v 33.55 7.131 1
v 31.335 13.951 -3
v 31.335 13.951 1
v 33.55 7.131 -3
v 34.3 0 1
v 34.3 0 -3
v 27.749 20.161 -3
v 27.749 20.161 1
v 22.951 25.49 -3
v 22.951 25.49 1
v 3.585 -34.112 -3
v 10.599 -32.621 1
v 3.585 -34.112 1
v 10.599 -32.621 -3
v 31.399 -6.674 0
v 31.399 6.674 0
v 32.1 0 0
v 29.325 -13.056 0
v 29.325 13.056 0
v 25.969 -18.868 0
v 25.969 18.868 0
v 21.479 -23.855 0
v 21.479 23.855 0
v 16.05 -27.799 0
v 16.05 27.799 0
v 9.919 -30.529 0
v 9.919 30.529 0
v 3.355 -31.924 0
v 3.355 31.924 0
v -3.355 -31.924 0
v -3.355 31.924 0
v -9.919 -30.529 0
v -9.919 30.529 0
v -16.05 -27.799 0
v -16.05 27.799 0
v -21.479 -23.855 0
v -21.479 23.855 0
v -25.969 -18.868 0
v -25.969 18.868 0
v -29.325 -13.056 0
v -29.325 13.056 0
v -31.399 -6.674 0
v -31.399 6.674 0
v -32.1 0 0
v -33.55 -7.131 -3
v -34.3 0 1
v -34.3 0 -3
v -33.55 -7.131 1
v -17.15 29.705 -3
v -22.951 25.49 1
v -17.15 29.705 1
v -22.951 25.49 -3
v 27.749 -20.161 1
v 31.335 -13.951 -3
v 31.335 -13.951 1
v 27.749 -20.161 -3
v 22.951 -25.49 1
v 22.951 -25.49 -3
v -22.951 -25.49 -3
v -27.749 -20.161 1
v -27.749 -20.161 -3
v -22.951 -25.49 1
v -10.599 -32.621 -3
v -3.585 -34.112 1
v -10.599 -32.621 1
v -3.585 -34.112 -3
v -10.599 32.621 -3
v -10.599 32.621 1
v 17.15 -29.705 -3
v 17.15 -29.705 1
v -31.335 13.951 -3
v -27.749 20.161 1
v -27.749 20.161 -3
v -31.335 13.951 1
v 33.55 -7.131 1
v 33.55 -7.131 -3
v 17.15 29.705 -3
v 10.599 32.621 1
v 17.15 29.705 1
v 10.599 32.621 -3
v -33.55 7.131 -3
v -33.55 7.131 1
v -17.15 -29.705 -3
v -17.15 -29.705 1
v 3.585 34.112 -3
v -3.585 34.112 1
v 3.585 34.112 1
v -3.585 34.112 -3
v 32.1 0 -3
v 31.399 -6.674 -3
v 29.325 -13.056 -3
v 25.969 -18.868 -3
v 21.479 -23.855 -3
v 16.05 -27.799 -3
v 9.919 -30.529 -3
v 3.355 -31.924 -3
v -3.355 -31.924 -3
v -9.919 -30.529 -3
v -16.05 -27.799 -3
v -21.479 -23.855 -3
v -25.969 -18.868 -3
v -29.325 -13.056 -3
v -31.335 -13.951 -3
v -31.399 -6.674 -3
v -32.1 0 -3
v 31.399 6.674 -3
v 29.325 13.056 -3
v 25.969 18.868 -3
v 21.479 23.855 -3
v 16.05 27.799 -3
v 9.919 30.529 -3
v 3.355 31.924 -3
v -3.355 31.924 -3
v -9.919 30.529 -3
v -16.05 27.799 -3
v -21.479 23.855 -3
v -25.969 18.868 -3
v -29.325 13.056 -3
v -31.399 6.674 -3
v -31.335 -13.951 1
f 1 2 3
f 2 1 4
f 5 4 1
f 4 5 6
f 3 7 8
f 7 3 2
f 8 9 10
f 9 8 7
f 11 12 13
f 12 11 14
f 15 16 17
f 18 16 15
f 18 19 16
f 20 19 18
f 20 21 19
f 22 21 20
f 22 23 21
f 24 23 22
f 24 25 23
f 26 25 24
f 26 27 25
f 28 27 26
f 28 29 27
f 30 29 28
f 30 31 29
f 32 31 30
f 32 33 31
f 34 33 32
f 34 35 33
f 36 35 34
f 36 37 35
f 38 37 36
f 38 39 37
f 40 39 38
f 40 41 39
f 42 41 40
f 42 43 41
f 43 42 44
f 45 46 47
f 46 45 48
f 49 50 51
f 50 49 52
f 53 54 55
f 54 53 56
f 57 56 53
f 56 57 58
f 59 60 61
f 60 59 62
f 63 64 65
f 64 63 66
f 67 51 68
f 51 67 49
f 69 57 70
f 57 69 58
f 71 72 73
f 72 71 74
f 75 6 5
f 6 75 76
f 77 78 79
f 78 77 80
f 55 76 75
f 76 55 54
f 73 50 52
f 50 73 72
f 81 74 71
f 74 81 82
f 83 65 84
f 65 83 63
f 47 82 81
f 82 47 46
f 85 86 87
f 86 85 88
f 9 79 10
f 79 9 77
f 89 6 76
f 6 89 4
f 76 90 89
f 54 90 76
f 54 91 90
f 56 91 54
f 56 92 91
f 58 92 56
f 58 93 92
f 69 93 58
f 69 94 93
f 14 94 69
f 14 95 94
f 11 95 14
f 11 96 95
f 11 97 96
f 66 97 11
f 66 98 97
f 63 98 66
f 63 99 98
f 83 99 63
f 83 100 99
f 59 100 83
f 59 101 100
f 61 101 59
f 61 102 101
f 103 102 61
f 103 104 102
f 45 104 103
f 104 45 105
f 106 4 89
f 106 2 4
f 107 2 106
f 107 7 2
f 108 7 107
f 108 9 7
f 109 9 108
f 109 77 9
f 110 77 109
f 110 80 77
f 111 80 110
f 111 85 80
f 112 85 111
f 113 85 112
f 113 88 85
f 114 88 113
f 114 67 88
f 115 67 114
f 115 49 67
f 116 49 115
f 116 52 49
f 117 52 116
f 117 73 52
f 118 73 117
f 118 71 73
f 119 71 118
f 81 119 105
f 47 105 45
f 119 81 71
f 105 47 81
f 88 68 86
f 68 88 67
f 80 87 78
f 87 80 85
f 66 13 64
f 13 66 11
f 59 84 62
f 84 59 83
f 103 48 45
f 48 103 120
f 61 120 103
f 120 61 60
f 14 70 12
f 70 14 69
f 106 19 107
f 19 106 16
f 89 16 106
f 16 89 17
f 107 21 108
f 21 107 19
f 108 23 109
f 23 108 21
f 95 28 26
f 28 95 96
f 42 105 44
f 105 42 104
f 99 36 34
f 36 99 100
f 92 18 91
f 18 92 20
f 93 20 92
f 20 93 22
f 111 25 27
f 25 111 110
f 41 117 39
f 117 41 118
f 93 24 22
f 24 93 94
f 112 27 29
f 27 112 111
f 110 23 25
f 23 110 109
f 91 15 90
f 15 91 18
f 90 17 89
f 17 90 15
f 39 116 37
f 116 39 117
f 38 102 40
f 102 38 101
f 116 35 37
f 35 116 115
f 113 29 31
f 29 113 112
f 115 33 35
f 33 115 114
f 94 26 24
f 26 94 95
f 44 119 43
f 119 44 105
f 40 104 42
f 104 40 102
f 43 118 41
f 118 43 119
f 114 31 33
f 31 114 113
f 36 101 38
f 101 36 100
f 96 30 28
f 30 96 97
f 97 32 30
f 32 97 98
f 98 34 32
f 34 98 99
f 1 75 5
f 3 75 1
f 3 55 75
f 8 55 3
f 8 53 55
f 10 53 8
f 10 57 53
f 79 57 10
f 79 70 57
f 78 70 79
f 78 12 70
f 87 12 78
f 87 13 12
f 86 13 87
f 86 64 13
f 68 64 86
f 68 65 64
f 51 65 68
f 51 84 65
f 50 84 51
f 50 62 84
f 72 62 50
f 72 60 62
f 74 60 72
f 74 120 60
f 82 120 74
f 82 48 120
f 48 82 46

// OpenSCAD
// file: common-vals.scad
gThickness = 1;

gBlade_height = 25;
gBlade_width = 15;

gBlades_outer_diam = 60;
gBlades_outer_rad = gBlades_outer_diam/2;

gBlades_inner_diam = gBlades_outer_diam - gBlade_width*2;

gBlade_support_ring_thickness = 2.2;
gBlade_support_ring_depth = 3;

gPinhole_diam = 4.6;

gFastener_hole_diam = 2;
gNum_fastener_holes = 4;

gFastener_outer_diam = 20;
gFastener_depth = 4;

gBlade_support_ring_outer_diam = gBlades_outer_diam + gBlade_width/2 + gBlade_support_ring_thickness/2;

gWheel_outer_diam = gBlades_outer_diam;

gMotor_pin_diam = 1.93;

gCase_gap = 2;
gCase_outer_diam = gWheel_outer_diam + gCase_gap*2 + gThickness*2;
gCase_depth_gap = 0.8;

gOutlet_height = gBlade_width;
gOutlet_length = 5;
gOutlet_lip_height = 2;
gOutlet_lip_width = 1.5;

gMotor_podium_diam = 6;
gMotor_podium_height = 1.68;
gMotor_screw_hole_diam = 2;
gMotor_screw_hole_offset = 1;

gFront_wrap_depth = 20;

gCase_front_center_hole_diam = gCase_outer_diam-gThickness*2-15;
// main file
include <../centrifugal-fan/common-vals.scad>

ring_inner_diam = gBlade_support_ring_outer_diam - gBlade_support_ring_thickness*2;

cylinder(h = gThickness, d = gBlade_support_ring_outer_diam);

translate([0, 0, -gBlade_support_ring_depth])
difference() {
    cylinder(gBlade_support_ring_depth, d = gBlade_support_ring_outer_diam);

    translate([0, 0, -0.1])
    cylinder(gBlade_support_ring_depth + 0.2, d = ring_inner_diam);
}
